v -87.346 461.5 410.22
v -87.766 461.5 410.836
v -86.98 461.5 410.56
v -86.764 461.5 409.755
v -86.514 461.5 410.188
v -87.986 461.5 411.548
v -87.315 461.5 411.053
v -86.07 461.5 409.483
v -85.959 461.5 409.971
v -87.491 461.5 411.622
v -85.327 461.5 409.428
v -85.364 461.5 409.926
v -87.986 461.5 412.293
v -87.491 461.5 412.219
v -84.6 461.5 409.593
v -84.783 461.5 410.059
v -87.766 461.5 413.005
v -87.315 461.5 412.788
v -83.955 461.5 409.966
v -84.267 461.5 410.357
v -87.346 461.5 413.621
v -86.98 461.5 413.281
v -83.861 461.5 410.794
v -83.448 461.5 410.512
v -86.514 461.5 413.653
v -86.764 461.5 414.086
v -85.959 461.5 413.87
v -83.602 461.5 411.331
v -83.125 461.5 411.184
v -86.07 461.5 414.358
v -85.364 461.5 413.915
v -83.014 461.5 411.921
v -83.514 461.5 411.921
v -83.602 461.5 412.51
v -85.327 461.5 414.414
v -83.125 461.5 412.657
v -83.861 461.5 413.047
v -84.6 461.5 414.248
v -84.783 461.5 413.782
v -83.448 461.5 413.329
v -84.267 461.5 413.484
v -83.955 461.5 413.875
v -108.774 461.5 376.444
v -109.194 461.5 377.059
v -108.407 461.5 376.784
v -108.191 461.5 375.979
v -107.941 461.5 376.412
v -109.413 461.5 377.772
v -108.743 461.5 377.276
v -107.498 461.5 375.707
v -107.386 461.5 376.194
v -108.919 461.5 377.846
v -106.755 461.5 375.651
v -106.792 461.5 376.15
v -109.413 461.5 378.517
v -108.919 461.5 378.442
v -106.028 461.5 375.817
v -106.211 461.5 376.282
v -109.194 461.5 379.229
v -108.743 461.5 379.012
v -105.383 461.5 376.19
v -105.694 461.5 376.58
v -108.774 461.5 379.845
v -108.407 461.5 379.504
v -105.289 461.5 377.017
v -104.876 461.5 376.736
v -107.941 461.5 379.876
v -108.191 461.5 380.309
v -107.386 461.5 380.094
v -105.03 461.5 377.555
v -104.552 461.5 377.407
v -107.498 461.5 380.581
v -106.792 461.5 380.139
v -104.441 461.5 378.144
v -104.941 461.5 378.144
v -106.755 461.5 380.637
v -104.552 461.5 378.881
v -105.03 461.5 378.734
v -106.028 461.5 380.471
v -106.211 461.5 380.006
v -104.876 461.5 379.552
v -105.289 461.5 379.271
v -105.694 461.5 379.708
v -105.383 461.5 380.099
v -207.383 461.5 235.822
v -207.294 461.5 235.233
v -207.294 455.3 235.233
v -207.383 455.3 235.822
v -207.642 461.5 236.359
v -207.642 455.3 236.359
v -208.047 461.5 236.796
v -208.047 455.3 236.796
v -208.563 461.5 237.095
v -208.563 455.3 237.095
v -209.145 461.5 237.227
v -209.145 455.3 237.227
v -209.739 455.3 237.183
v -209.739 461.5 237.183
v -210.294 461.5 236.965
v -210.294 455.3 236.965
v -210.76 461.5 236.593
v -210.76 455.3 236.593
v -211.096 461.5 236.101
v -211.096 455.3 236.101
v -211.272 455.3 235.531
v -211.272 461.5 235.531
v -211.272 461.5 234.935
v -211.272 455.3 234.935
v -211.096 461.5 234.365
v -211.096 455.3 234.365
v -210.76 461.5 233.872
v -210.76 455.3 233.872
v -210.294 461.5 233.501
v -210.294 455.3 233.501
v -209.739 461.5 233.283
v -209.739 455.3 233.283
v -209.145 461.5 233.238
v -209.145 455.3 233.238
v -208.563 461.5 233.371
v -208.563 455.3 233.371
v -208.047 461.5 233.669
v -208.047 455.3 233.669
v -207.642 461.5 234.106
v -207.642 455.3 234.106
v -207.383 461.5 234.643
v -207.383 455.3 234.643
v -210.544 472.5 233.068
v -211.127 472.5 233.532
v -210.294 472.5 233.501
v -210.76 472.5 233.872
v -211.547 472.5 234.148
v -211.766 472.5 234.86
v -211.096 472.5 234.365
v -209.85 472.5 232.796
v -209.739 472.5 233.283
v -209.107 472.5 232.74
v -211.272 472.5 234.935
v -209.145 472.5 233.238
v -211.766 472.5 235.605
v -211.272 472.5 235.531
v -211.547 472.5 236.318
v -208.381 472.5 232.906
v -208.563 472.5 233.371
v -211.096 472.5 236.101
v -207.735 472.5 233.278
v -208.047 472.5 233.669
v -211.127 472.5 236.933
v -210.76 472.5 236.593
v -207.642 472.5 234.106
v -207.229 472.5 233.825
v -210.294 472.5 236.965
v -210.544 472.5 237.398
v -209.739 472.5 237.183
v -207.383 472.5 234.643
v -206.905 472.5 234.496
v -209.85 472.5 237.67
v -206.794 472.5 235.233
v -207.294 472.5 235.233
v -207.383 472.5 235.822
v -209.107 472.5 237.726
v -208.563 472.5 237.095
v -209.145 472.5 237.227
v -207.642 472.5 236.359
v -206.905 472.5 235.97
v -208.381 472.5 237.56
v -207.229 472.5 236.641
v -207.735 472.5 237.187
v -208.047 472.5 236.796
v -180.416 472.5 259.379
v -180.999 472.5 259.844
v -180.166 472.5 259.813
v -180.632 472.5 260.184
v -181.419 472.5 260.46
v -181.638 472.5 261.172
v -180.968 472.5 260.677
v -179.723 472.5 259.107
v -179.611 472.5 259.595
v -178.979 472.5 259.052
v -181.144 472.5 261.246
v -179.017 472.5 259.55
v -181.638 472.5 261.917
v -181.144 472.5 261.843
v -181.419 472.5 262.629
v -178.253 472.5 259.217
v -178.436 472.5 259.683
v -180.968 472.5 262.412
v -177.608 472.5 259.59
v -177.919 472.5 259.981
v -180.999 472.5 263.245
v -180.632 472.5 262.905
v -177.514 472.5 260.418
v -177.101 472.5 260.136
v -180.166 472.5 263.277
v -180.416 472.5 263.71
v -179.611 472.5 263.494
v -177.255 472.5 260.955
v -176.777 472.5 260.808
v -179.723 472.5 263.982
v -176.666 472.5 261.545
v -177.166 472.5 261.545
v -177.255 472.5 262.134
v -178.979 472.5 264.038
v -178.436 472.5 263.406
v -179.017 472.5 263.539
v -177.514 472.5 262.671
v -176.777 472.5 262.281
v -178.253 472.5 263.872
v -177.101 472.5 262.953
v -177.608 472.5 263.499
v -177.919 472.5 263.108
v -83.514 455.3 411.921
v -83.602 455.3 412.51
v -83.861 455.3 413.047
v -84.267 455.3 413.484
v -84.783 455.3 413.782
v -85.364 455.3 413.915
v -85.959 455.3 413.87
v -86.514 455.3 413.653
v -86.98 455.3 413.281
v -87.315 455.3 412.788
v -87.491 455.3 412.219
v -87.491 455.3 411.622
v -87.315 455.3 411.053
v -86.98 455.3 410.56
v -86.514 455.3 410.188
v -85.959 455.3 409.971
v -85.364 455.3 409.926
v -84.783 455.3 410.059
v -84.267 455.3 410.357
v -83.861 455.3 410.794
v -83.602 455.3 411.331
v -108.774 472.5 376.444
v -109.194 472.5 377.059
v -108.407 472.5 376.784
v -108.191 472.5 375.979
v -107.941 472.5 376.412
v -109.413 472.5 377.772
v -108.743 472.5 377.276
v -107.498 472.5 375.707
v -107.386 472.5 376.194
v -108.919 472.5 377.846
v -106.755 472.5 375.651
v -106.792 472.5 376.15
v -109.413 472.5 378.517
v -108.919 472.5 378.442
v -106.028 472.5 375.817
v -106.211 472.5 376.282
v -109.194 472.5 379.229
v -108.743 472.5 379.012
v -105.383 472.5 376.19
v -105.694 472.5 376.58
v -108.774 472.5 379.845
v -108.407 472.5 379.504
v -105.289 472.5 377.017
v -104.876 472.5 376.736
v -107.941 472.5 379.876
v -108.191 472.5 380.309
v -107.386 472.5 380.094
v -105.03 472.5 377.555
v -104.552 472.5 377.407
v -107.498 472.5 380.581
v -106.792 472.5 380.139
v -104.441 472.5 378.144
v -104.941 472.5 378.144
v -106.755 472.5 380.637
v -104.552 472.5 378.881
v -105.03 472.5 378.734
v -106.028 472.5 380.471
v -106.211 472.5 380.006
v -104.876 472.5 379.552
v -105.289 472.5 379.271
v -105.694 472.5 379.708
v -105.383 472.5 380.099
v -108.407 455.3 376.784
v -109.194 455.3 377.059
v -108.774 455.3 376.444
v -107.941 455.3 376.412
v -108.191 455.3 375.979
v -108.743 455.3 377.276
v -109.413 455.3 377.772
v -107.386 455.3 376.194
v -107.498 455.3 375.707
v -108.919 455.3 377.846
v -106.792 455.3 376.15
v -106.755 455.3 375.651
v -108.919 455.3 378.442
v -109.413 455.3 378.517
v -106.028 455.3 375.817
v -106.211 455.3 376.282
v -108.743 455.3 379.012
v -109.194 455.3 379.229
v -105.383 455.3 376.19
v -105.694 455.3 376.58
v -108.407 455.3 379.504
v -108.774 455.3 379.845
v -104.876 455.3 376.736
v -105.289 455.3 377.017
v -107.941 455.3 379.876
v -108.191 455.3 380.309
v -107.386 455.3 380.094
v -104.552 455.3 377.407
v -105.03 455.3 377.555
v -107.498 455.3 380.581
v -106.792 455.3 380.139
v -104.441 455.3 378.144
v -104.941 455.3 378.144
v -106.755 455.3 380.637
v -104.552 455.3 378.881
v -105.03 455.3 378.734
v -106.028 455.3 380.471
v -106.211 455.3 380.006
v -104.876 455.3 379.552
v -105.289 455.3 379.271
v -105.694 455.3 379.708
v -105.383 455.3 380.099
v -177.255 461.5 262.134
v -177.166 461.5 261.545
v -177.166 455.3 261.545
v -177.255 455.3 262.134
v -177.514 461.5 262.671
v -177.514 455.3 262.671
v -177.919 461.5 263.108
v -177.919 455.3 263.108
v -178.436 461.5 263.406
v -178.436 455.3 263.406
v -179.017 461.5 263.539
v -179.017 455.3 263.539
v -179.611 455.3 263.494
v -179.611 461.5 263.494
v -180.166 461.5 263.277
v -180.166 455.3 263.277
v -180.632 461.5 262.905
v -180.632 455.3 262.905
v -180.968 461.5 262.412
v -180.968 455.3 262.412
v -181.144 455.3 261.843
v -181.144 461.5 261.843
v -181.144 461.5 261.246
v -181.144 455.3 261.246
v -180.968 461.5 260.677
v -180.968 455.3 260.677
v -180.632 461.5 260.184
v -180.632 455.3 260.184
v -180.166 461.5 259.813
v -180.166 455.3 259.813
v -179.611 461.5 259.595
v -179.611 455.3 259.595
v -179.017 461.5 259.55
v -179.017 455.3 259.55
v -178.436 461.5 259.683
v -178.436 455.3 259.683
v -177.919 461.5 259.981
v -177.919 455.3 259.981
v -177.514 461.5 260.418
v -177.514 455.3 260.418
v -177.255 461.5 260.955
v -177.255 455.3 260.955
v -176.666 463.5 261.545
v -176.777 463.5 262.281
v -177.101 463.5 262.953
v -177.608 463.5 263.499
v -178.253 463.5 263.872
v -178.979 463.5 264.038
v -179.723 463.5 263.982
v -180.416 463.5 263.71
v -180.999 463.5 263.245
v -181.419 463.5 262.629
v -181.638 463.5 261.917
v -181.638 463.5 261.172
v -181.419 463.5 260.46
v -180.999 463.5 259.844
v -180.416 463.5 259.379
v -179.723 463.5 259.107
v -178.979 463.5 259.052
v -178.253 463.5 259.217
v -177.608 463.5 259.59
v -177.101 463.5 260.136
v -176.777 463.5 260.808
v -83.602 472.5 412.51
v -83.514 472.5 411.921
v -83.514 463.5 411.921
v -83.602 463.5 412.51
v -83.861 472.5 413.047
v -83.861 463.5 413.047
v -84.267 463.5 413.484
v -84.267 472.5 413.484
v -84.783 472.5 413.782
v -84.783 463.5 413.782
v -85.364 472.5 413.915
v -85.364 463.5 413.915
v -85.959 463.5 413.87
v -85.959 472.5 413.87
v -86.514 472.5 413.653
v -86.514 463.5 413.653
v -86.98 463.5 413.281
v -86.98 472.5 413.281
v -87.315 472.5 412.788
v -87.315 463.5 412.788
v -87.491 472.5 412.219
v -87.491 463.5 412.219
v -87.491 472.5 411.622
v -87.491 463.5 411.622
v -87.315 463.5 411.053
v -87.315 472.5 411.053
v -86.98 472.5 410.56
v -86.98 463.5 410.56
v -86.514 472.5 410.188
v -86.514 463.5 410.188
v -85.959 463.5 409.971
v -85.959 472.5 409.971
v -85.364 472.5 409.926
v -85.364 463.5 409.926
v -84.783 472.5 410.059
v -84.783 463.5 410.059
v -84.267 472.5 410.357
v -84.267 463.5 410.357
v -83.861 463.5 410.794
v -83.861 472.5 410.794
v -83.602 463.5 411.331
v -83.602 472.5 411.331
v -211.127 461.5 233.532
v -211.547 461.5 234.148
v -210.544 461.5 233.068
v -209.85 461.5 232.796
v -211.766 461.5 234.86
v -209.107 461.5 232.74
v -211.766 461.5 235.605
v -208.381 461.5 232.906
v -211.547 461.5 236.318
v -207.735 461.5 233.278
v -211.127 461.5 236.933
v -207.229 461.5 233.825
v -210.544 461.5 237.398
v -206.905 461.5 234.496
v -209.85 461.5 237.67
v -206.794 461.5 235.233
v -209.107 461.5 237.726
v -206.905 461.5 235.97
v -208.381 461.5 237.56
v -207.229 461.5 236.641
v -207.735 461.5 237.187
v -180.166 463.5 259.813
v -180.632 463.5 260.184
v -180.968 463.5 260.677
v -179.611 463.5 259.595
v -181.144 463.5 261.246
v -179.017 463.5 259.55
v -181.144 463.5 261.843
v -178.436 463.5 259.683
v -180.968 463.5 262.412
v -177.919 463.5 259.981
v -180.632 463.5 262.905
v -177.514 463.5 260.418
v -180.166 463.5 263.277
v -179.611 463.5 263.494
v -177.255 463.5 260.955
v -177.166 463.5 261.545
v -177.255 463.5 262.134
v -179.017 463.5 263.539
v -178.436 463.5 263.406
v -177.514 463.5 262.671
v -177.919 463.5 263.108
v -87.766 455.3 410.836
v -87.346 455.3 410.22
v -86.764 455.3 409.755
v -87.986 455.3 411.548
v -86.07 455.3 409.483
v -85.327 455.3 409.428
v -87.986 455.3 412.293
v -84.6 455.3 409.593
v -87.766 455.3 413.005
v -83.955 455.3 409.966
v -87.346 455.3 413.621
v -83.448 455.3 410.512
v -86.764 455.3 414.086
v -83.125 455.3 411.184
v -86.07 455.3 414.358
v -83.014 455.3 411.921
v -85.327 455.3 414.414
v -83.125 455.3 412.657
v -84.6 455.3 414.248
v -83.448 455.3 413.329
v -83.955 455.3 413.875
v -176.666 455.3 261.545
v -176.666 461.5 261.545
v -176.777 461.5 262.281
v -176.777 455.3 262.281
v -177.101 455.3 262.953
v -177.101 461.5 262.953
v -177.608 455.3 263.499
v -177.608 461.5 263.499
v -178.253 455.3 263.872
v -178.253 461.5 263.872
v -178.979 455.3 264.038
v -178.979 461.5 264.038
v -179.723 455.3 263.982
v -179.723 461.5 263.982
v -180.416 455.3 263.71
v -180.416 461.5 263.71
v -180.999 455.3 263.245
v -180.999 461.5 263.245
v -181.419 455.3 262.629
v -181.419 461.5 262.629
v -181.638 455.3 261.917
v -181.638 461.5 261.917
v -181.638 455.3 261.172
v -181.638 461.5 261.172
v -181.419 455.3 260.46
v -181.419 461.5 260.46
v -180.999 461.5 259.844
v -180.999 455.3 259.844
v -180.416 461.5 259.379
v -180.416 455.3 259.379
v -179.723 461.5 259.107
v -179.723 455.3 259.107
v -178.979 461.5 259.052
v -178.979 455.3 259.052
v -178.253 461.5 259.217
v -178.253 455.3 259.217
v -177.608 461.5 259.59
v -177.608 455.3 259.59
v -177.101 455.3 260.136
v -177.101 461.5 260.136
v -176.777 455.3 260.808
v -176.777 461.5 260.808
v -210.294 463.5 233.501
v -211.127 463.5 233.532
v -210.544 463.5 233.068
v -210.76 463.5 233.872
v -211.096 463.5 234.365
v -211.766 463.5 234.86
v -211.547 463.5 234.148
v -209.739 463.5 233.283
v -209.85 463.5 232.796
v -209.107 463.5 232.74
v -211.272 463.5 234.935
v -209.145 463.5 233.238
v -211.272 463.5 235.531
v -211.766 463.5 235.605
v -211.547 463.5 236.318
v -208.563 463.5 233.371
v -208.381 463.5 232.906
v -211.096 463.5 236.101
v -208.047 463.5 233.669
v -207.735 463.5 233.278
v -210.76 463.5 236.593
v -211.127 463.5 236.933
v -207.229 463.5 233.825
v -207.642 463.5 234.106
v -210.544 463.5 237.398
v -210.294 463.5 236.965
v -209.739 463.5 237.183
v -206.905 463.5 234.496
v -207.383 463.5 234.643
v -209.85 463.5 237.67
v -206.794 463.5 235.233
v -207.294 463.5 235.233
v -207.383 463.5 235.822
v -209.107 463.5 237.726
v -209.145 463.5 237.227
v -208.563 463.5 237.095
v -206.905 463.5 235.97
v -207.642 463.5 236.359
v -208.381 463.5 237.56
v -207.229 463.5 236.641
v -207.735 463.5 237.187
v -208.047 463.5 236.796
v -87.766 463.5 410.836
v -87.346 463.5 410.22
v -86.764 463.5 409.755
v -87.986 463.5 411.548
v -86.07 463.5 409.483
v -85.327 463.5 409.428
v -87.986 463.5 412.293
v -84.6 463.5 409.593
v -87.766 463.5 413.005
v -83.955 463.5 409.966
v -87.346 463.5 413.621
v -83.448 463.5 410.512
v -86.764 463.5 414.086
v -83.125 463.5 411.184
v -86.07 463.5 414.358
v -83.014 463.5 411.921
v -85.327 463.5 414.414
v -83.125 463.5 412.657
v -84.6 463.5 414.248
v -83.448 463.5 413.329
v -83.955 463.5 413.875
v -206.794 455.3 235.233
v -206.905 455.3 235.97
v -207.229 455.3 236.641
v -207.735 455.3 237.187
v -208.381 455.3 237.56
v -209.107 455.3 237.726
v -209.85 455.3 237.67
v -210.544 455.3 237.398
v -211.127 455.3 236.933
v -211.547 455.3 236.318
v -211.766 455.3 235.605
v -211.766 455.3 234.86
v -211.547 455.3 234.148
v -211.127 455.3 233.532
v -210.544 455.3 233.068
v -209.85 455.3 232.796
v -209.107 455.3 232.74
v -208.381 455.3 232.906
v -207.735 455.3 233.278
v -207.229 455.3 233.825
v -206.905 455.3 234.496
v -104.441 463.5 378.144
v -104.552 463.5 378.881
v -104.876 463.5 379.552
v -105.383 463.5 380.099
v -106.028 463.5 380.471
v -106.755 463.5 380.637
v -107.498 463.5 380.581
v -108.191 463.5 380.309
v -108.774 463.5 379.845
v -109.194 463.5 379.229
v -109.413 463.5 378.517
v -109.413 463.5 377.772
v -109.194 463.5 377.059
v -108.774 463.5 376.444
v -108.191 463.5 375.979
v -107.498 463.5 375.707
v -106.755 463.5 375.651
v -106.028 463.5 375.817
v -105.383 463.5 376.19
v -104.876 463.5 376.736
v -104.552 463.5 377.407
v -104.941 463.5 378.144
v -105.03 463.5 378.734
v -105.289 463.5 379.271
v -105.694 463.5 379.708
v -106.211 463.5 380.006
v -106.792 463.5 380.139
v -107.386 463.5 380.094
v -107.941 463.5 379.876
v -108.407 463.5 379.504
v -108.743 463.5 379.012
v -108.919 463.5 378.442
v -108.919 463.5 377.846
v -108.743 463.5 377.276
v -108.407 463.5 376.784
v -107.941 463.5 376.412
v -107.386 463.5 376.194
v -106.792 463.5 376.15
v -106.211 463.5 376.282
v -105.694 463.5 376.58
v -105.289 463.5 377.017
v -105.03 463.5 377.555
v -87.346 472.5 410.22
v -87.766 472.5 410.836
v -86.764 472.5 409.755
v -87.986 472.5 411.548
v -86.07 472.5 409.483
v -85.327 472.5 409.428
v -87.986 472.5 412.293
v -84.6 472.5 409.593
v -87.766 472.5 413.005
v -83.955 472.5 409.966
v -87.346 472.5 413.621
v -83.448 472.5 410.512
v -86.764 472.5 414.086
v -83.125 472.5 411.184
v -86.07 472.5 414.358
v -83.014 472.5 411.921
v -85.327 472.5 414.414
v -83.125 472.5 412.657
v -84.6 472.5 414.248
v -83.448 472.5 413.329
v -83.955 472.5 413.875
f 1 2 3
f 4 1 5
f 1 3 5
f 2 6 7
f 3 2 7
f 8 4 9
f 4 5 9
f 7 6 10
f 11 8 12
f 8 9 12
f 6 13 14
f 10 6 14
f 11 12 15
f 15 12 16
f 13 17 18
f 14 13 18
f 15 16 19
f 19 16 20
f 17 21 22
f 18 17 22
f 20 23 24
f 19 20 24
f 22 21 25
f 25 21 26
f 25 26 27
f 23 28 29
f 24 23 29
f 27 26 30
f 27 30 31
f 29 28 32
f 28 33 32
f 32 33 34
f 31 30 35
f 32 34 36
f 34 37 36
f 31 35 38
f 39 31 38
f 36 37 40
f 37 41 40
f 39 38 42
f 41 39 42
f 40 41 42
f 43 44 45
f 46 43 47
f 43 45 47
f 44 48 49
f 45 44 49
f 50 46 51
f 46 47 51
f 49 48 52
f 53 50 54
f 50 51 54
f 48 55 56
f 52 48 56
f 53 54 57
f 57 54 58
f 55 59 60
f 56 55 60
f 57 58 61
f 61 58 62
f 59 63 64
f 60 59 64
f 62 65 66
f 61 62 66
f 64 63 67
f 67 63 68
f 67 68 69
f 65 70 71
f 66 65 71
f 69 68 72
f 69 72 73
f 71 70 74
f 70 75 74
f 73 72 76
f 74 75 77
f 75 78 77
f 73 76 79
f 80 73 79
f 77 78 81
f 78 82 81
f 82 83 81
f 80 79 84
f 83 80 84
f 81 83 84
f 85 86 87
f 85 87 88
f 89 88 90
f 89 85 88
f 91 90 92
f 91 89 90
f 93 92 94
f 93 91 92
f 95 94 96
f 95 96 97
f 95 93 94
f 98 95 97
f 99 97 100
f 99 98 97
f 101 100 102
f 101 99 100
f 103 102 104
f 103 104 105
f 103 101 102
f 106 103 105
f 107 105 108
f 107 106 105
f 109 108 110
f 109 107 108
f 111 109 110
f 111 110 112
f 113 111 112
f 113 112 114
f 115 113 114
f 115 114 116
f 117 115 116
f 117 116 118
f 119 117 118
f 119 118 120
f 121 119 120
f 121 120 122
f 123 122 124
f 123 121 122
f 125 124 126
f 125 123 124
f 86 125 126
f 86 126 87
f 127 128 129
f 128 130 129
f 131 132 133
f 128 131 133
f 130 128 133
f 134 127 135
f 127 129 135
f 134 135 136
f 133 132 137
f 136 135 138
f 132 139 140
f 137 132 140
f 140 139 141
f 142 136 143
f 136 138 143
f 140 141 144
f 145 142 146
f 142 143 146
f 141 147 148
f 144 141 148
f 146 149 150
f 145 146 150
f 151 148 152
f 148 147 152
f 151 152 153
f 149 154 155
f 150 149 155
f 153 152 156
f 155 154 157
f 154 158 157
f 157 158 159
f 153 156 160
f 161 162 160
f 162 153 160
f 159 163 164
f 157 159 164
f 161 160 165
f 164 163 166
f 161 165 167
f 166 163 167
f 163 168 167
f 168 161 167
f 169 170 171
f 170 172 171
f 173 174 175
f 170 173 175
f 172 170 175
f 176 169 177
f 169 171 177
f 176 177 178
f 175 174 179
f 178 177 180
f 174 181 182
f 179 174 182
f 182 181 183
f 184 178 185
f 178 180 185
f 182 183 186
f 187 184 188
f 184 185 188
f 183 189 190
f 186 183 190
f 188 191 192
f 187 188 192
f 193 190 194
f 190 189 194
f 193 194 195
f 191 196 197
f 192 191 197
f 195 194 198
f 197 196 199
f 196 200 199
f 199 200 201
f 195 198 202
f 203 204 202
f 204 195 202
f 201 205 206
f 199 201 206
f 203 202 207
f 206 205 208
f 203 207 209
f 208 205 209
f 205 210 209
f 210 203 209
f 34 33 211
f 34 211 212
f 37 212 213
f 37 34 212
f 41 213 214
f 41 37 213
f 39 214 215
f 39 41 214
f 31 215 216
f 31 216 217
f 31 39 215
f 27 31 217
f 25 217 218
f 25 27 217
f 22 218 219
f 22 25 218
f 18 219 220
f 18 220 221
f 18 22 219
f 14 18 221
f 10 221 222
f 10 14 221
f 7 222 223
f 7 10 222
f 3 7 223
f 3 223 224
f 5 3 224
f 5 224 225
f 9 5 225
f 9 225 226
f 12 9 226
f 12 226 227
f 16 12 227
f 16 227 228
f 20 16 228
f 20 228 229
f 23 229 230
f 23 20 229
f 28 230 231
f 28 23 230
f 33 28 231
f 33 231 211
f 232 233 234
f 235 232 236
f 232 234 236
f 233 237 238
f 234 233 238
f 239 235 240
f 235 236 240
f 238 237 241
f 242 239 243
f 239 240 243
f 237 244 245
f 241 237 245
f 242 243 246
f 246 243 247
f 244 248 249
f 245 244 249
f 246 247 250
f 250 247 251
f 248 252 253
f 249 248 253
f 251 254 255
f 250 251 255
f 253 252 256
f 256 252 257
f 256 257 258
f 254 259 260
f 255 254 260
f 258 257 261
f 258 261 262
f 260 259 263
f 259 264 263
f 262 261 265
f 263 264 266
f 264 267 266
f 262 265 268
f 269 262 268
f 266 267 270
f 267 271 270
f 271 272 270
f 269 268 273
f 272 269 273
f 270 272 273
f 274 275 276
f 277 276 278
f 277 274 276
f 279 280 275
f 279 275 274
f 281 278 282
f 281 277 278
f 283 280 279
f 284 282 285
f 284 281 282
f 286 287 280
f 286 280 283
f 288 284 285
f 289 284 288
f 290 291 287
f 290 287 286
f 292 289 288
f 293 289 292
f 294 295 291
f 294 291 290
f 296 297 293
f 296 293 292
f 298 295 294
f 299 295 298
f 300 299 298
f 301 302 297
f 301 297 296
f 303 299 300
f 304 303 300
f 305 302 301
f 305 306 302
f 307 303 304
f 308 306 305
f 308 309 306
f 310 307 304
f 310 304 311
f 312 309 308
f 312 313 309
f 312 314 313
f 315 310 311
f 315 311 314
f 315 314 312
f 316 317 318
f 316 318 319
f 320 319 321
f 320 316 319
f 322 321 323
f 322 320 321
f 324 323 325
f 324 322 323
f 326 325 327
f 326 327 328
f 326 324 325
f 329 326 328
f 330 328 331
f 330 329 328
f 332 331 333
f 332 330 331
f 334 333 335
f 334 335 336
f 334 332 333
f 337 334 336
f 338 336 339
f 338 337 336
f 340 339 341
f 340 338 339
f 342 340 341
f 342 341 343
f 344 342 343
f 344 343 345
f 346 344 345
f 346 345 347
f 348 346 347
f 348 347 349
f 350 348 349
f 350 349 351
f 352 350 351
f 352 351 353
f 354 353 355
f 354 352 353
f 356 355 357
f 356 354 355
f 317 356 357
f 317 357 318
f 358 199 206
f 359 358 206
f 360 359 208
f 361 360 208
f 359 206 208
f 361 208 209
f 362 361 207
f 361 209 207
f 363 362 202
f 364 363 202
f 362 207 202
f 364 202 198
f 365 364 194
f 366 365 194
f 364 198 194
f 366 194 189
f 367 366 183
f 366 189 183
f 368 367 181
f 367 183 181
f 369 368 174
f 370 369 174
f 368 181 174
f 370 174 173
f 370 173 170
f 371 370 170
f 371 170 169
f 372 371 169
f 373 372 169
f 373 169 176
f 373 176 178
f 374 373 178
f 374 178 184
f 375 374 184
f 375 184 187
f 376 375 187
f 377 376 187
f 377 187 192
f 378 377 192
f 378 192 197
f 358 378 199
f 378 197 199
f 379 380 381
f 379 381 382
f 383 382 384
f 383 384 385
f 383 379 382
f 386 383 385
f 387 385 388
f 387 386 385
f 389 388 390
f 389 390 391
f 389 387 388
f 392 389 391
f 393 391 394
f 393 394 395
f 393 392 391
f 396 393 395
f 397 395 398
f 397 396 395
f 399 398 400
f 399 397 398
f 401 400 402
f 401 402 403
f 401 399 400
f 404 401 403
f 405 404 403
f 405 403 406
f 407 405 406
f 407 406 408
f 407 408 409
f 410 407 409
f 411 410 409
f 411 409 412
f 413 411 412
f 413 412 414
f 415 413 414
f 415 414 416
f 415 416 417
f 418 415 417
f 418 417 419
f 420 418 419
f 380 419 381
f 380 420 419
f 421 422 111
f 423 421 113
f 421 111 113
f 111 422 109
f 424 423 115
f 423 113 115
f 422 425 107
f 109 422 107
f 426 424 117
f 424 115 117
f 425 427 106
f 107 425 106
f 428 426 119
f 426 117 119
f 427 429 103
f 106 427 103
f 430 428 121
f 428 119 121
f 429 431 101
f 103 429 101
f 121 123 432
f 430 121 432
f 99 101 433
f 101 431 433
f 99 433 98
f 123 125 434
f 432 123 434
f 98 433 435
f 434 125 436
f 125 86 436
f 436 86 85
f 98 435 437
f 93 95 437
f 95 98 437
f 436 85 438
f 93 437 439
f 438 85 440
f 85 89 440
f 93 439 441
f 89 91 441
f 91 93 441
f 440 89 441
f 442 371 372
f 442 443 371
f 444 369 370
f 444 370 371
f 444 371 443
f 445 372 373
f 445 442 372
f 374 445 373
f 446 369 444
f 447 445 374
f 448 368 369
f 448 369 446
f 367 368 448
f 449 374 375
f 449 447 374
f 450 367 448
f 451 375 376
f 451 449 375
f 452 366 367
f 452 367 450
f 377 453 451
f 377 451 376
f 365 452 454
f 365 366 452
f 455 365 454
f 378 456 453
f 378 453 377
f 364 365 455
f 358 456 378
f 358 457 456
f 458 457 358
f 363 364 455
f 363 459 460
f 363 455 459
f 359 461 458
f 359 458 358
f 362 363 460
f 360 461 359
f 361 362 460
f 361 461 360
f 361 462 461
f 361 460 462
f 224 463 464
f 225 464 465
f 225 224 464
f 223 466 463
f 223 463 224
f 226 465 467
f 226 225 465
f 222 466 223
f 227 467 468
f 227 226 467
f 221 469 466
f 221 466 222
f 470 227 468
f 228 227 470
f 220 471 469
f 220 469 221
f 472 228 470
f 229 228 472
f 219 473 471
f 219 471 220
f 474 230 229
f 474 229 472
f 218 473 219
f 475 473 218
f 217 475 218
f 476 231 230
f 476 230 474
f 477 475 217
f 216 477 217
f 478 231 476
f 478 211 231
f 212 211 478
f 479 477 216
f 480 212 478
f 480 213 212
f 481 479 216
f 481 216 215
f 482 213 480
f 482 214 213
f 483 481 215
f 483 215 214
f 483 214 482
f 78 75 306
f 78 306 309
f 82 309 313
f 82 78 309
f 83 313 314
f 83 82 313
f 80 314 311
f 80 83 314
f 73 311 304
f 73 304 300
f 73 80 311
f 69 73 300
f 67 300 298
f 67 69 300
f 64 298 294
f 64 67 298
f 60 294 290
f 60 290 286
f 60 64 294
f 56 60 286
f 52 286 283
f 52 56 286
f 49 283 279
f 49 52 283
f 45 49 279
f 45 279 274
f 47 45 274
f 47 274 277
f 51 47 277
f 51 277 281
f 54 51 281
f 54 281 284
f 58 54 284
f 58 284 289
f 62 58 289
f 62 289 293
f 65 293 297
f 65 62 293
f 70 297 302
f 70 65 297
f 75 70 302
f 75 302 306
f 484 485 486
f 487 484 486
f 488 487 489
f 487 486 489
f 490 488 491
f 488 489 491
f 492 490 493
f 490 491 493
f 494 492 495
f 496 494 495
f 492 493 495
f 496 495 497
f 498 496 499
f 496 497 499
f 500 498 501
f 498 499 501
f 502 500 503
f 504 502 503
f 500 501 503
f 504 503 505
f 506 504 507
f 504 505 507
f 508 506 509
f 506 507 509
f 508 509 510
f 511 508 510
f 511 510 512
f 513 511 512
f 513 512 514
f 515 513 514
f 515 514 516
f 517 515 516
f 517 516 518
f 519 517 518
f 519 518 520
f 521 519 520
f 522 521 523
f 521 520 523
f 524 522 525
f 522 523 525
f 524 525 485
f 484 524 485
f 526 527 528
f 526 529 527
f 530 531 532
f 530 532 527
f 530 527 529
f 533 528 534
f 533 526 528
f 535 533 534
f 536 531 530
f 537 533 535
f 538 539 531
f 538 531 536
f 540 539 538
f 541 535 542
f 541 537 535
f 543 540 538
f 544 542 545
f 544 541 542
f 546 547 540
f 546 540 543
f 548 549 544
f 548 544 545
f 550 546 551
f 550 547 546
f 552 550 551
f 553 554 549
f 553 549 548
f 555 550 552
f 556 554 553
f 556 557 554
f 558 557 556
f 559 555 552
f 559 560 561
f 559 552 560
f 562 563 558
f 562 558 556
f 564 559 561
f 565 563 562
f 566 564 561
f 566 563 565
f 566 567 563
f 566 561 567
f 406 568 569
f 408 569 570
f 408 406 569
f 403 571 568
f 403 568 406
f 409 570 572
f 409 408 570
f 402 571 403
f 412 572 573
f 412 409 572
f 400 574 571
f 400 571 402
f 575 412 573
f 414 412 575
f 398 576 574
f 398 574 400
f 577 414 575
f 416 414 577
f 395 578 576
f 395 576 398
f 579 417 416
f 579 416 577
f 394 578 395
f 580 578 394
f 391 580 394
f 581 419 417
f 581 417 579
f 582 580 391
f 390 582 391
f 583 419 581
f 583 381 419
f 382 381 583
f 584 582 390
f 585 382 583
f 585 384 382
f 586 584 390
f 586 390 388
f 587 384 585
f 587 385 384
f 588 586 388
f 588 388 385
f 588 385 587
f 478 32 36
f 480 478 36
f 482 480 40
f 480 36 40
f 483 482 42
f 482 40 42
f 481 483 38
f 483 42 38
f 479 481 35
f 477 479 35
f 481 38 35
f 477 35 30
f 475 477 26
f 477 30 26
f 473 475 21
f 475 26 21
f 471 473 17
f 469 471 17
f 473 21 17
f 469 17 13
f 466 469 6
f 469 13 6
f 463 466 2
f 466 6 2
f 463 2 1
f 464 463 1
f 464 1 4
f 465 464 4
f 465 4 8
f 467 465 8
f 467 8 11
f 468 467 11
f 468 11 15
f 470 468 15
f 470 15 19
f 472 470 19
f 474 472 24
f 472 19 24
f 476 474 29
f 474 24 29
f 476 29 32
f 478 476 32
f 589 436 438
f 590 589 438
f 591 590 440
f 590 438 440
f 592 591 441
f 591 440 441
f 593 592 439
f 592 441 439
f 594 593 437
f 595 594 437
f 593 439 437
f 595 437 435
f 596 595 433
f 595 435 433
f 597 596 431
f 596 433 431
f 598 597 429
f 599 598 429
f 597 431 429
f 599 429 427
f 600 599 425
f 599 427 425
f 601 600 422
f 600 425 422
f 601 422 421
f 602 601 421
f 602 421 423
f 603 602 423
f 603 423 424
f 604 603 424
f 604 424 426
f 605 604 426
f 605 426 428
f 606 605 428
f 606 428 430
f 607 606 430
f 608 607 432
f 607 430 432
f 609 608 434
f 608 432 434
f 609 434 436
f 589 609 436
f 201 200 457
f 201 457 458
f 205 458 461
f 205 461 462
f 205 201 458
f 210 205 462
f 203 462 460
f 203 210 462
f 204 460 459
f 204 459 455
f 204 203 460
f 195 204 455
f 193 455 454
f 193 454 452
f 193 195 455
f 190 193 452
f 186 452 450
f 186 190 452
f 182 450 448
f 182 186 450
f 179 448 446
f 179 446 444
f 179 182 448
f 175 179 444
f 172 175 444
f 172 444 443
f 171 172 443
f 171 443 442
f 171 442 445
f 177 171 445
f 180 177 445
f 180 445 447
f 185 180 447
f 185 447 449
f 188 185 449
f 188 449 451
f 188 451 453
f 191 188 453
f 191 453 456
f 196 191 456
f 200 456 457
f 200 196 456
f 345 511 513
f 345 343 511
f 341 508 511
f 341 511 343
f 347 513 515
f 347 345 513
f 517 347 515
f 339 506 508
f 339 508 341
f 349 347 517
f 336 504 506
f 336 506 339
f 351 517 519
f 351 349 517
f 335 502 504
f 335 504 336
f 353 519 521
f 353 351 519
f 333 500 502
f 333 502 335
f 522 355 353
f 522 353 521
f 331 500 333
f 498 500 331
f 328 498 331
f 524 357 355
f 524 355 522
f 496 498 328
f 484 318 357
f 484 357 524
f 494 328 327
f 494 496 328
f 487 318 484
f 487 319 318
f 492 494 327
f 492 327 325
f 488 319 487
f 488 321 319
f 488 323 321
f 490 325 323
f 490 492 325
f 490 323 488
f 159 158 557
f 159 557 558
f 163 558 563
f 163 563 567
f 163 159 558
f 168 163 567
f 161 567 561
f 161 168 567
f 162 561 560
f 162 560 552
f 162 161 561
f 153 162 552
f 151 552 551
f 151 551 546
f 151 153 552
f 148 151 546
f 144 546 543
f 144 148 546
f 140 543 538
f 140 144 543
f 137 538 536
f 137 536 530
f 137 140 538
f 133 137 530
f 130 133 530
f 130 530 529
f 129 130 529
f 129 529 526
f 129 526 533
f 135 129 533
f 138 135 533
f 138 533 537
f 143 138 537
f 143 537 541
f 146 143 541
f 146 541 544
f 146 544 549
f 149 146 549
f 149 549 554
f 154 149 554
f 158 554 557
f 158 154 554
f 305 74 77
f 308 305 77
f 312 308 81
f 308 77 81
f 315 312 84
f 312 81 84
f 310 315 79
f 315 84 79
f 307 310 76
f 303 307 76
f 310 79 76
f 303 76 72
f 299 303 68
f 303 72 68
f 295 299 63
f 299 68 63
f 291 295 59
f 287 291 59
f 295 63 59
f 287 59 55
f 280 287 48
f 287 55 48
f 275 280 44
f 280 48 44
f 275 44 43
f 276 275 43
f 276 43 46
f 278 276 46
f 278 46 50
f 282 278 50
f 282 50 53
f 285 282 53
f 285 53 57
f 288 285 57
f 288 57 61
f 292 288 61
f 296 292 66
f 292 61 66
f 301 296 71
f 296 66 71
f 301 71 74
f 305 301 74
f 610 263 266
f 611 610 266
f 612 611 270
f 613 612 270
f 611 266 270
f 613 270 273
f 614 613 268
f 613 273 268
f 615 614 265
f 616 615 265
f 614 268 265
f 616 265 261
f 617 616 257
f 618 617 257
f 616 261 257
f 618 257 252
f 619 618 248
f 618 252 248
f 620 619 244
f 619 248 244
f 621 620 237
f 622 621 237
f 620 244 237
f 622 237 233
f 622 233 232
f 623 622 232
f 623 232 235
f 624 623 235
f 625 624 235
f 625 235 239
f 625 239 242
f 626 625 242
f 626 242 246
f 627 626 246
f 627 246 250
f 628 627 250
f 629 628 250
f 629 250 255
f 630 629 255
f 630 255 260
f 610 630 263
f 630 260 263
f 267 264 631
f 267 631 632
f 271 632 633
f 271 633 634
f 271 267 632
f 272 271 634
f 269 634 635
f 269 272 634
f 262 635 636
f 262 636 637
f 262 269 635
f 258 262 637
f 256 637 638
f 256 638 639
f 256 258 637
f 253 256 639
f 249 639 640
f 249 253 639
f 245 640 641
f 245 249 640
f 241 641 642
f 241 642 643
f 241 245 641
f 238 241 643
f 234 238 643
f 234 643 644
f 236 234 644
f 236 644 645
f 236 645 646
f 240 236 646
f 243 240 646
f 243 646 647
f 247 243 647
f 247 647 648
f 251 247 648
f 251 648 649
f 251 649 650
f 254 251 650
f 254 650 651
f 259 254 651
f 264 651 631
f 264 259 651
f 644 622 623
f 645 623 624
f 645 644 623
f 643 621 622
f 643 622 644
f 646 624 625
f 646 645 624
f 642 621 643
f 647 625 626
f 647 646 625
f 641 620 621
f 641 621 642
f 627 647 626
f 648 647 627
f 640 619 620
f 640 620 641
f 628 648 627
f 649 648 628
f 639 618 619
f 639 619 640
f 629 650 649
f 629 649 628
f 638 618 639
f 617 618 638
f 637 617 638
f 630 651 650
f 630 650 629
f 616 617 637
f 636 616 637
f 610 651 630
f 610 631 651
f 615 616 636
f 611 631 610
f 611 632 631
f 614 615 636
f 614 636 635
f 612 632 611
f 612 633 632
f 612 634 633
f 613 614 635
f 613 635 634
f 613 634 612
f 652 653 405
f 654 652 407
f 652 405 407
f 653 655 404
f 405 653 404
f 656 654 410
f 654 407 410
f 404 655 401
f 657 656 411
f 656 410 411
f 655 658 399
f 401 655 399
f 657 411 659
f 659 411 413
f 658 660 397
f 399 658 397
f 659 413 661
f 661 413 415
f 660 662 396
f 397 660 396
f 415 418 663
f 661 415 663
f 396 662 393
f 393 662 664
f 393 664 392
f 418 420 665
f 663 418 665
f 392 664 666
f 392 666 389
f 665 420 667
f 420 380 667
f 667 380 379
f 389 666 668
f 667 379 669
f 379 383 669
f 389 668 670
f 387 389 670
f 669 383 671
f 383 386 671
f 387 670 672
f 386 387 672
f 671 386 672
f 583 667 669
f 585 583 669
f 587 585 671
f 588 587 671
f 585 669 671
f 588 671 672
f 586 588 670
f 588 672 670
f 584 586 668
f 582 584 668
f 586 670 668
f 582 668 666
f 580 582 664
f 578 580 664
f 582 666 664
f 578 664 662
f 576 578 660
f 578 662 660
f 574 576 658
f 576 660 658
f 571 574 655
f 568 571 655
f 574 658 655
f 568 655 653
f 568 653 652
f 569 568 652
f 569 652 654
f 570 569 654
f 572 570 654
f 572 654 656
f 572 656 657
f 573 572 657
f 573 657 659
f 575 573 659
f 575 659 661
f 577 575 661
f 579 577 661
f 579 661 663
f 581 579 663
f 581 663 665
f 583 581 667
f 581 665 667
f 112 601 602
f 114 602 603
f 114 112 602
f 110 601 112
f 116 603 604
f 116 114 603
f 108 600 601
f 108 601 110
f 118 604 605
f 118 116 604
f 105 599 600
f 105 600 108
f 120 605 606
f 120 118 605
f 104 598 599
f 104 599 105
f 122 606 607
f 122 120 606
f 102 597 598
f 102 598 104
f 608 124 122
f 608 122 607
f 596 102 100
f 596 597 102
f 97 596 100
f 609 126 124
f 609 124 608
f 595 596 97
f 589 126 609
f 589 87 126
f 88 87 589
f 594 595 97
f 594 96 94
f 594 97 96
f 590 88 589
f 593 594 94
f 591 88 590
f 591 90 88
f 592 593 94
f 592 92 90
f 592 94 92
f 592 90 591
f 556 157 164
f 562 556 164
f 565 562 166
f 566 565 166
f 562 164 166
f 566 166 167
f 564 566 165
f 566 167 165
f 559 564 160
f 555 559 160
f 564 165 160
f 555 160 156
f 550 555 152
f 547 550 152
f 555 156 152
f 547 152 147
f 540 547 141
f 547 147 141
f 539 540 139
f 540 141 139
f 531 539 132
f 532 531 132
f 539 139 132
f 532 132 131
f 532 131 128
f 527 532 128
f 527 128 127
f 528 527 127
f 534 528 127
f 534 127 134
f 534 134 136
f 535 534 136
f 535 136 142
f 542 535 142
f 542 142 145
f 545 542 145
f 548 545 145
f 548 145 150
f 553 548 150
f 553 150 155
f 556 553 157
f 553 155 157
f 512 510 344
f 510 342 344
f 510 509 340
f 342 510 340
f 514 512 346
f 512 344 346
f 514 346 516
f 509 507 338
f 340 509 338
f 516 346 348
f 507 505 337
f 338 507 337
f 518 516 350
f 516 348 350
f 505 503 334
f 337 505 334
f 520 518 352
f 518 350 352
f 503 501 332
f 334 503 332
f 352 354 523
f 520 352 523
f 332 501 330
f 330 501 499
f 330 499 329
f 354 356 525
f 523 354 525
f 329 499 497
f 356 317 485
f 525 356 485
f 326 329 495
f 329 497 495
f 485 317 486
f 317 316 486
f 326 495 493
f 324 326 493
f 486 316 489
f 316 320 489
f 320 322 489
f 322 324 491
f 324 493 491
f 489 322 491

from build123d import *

# Parameters (mm, degrees)
SZKIC1_R                      = 2.5
SZKIC1_R_2                    = 2
DODANIE_WYCI_GNI_CIE1_DEPTH   = 9
DODANIE_WYCI_GNI_CIE1_2_DEPTH = 9
DODANIE_WYCI_GNI_CIE1_3_DEPTH = 9
DODANIE_WYCI_GNI_CIE1_4_DEPTH = 9
SZKIC2_R                      = 2.5
SZKIC2_R_2                    = 2.000000003
DODANIE_WYCI_GNI_CIE2_DEPTH   = 6.2
SZKIC2_R_3                    = 1.999999997
DODANIE_WYCI_GNI_CIE2_2_DEPTH = 6.2
SZKIC2_R_4                    = 2
DODANIE_WYCI_GNI_CIE2_3_DEPTH = 6.2
DODANIE_WYCI_GNI_CIE2_4_DEPTH = 6.2


with BuildPart() as part:
    # Szkic1 → Dodanie-wyciągnięcie1 (new body)
    with BuildSketch(Plane.XZ.offset(-472.5)):
        with Locations((-209.294177747, 235.232823684)):
            Circle(SZKIC1_R)
        with Locations((-209.294177747, 235.232823684)):
            Circle(SZKIC1_R_2, mode=Mode.SUBTRACT)
    extrude(amount=DODANIE_WYCI_GNI_CIE1_DEPTH)


with BuildPart() as body_2:
    # Szkic1 → Dodanie-wyci_gni_cie1 2 (new body)
    with BuildSketch(Plane.XZ.offset(-472.5)):
        with Locations((-179.166238959, 261.544556892)):
            Circle(SZKIC1_R)
        with Locations((-179.166238959, 261.544556892)):
            Circle(SZKIC1_R_2, mode=Mode.SUBTRACT)
    extrude(amount=DODANIE_WYCI_GNI_CIE1_2_DEPTH)


with BuildPart() as body_3:
    # Szkic1 → Dodanie-wyci_gni_cie1 3 (new body)
    with BuildSketch(Plane.XZ.offset(-472.5)):
        with Locations((-106.941386538, 378.144106321)):
            Circle(SZKIC1_R)
        with Locations((-106.941386538, 378.144106321)):
            Circle(SZKIC1_R_2, mode=Mode.SUBTRACT)
    extrude(amount=DODANIE_WYCI_GNI_CIE1_3_DEPTH)


with BuildPart() as body_4:
    # Szkic1 → Dodanie-wyci_gni_cie1 4 (new body)
    with BuildSketch(Plane.XZ.offset(-472.5)):
        with Locations((-85.513533731, 411.920534849)):
            Circle(SZKIC1_R)
        with Locations((-85.513533731, 411.920534849)):
            Circle(SZKIC1_R_2, mode=Mode.SUBTRACT)
    extrude(amount=DODANIE_WYCI_GNI_CIE1_4_DEPTH)


with BuildPart() as body_5:
    # Szkic2 → Dodanie-wyciągnięcie2 (new body)
    with BuildSketch(Plane.XZ.offset(-461.5)):
        with Locations((-209.294177747, 235.232823684)):
            Circle(SZKIC2_R)
        with Locations((-209.294177747, 235.232823684)):
            Circle(SZKIC2_R_2, mode=Mode.SUBTRACT)
    extrude(amount=DODANIE_WYCI_GNI_CIE2_DEPTH)


with BuildPart() as body_6:
    # Szkic2 → Dodanie-wyci_gni_cie2 2 (new body)
    with BuildSketch(Plane.XZ.offset(-461.5)):
        with Locations((-179.166238959, 261.544556892)):
            Circle(SZKIC2_R)
        with Locations((-179.166238959, 261.544556892)):
            Circle(SZKIC2_R_3, mode=Mode.SUBTRACT)
    extrude(amount=DODANIE_WYCI_GNI_CIE2_2_DEPTH)


with BuildPart() as body_7:
    # Szkic2 → Dodanie-wyci_gni_cie2 3 (new body)
    with BuildSketch(Plane.XZ.offset(-461.5)):
        with Locations((-106.941386538, 378.144106321)):
            Circle(SZKIC2_R)
        with Locations((-106.941386538, 378.144106321)):
            Circle(SZKIC2_R_4, mode=Mode.SUBTRACT)
    extrude(amount=DODANIE_WYCI_GNI_CIE2_3_DEPTH)


with BuildPart() as body_8:
    # Szkic2 → Dodanie-wyci_gni_cie2 4 (new body)
    with BuildSketch(Plane.XZ.offset(-461.5)):
        with Locations((-85.513533731, 411.920534849)):
            Circle(SZKIC2_R)
        with Locations((-85.513533731, 411.920534849)):
            Circle(SZKIC2_R_4, mode=Mode.SUBTRACT)
    extrude(amount=DODANIE_WYCI_GNI_CIE2_4_DEPTH)


solid = Compound([part.part, body_2.part, body_3.part, body_4.part, body_5.part, body_6.part, body_7.part, body_8.part])
